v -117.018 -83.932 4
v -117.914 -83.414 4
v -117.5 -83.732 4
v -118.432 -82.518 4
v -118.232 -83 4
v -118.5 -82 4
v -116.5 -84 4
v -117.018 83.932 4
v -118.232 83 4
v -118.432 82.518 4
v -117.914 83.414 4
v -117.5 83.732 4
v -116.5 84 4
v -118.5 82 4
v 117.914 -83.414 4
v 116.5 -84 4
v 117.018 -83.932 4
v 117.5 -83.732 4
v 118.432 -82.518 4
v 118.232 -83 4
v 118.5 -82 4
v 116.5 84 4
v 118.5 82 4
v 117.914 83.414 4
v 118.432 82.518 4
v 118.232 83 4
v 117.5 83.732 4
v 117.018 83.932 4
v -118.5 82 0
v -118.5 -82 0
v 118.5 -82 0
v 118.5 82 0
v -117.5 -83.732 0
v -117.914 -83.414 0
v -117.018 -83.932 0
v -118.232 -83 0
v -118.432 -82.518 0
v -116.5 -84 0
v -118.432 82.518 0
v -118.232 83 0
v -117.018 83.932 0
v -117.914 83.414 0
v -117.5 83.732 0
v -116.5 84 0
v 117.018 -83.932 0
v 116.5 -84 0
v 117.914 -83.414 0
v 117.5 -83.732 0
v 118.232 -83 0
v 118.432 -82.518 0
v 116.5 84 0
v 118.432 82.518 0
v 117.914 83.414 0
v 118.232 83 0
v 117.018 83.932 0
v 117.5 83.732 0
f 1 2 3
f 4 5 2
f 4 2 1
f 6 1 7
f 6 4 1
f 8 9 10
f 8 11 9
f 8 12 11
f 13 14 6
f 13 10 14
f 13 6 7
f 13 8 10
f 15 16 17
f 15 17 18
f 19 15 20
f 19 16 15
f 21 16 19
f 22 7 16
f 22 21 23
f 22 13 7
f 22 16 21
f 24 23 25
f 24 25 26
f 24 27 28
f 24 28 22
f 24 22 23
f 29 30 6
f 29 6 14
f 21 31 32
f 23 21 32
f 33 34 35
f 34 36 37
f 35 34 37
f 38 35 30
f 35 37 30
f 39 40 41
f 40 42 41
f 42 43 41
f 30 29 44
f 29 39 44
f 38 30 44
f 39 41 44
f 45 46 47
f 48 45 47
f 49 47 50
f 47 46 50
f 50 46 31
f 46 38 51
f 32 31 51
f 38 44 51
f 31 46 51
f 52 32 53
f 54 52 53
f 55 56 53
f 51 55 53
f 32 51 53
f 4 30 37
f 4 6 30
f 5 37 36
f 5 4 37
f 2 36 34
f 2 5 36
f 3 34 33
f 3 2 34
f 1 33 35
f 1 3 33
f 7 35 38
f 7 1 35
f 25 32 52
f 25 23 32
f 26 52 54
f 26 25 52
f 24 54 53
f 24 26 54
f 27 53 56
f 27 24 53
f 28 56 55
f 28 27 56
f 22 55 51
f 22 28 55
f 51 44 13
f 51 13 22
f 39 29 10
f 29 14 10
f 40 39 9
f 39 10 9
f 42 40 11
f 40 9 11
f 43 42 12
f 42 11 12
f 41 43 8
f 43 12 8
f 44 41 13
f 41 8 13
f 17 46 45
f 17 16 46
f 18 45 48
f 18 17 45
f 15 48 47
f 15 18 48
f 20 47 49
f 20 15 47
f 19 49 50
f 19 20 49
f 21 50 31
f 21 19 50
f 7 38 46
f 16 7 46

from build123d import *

# Parameters (mm, degrees)
F0_W     = 237
F0_H     = 168
F1_DEPTH = 4
F2_R     = 2


with BuildPart() as f1:
    # F0 (on Top) → F1 (new body)
    with BuildSketch(Plane.XY):
        Rectangle(F0_W, F0_H)
    extrude(amount=F1_DEPTH)

    # F2
    f2_edges = [f1.edges().sort_by_distance(p)[0] for p in [
        (-118.5, -84, 2),
        (118.5, -84, 2),
        (118.5, 84, 2),
        (-118.5, 84, 2),
    ]]
    fillet(f2_edges, radius=F2_R)


solid = f1.part
